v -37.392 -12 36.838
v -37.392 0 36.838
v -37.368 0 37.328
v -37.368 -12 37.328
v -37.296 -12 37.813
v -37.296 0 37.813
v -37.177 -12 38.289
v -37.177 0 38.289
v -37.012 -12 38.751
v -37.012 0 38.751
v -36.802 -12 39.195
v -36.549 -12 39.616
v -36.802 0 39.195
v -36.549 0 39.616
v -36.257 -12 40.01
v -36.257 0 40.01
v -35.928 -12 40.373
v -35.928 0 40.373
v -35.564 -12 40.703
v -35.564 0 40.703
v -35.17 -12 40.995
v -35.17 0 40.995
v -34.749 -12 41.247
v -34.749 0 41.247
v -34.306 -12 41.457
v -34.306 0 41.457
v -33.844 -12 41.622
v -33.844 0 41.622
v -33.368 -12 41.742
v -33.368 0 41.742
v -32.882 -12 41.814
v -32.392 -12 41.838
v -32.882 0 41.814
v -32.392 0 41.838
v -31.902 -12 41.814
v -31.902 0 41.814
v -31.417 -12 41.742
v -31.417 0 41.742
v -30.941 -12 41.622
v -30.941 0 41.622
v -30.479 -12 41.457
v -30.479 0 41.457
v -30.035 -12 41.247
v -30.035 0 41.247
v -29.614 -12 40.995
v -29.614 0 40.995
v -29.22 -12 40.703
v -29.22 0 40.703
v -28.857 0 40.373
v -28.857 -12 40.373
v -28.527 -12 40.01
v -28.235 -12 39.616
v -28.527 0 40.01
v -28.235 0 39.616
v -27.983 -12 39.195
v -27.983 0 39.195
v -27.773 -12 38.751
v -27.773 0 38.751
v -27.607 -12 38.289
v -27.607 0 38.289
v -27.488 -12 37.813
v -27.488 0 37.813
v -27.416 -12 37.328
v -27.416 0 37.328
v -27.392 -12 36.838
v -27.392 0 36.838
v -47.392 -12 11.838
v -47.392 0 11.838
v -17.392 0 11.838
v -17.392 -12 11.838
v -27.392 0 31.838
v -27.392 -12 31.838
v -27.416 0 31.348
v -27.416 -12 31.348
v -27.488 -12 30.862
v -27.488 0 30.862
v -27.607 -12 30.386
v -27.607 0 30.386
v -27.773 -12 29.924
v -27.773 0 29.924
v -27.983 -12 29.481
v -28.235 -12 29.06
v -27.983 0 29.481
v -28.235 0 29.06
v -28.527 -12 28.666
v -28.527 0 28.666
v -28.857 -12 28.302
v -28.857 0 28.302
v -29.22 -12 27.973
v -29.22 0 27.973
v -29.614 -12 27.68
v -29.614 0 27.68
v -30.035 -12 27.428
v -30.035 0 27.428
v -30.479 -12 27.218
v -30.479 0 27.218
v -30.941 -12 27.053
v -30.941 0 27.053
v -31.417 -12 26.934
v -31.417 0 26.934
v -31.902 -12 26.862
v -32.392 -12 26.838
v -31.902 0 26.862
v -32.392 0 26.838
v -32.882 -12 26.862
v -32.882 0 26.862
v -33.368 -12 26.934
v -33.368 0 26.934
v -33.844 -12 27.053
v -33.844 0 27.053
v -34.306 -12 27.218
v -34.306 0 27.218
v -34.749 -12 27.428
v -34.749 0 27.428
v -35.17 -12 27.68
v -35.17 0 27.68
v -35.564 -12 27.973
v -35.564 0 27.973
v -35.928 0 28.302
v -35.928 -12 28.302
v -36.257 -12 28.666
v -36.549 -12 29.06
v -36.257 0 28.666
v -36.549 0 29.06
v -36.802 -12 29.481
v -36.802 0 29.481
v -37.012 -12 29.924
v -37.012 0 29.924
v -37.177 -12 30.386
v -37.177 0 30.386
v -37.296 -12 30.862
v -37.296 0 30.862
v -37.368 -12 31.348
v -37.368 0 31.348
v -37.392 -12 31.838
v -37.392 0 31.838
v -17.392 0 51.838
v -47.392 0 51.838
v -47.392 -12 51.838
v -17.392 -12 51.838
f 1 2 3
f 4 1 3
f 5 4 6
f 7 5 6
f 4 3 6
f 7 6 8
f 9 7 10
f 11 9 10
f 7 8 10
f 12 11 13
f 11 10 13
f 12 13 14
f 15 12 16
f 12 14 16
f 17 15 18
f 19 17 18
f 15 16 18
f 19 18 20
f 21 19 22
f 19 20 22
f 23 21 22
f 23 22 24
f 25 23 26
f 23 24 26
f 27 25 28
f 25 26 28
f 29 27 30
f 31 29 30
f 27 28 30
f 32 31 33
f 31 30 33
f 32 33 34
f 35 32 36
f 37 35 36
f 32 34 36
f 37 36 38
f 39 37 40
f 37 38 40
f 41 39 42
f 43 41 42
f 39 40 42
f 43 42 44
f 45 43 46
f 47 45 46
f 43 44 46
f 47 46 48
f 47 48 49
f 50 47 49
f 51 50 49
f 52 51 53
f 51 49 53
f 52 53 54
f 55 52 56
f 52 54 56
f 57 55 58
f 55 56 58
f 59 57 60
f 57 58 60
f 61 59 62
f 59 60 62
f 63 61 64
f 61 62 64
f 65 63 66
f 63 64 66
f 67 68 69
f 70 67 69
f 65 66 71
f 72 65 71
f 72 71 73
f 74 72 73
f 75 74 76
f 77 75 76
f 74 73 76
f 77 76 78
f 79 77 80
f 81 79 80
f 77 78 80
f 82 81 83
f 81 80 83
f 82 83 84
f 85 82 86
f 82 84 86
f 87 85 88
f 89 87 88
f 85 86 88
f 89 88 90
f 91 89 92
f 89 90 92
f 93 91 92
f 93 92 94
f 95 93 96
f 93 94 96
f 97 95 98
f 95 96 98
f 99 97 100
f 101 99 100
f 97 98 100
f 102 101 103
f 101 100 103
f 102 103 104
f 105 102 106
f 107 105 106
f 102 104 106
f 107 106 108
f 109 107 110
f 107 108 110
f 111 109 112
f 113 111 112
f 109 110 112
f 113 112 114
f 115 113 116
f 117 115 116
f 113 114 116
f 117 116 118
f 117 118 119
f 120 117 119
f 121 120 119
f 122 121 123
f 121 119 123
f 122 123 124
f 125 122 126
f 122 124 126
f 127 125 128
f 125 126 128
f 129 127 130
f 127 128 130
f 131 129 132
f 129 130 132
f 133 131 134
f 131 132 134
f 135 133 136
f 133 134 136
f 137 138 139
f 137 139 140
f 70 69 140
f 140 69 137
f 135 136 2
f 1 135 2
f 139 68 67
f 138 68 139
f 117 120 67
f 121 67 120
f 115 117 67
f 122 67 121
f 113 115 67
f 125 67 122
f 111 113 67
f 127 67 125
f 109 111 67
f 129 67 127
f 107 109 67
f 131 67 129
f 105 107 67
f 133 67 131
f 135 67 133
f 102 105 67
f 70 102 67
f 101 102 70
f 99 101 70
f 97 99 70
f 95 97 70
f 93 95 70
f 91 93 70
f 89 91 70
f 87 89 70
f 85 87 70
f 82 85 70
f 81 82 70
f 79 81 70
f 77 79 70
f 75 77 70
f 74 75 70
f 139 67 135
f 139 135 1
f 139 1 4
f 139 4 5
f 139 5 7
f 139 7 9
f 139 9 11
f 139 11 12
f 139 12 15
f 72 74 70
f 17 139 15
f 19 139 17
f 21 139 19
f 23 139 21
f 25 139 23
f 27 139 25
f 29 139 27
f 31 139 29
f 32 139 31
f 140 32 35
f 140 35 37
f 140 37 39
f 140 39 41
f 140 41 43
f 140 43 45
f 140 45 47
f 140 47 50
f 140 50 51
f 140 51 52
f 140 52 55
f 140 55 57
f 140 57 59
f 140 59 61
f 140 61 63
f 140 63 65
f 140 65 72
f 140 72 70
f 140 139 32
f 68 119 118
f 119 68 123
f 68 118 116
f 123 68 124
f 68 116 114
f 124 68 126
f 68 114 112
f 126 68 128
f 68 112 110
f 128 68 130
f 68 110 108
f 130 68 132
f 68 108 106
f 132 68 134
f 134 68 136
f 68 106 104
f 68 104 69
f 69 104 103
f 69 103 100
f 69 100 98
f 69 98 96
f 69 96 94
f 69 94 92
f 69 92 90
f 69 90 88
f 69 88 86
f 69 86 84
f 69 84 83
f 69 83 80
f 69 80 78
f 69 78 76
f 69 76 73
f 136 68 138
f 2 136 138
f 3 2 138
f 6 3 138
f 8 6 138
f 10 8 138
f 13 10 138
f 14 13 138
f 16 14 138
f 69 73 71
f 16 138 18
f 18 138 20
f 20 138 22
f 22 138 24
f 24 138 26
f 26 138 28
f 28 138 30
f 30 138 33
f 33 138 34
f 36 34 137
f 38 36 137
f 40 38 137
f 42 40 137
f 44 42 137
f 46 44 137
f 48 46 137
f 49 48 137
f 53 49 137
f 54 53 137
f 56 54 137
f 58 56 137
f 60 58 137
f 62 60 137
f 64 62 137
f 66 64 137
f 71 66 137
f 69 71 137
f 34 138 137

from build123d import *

# Parameters (mm, degrees)
F0_W     = 30
F0_H     = 40
F1_DEPTH = 12


with BuildPart() as f1:
    # F0 (on Front) → F1 (new body)
    with BuildSketch(Plane.XZ):
        with Locations((-32.392114, 31.837786)):
            Rectangle(F0_W, F0_H)
        with BuildLine():
            ThreePointArc((-37.392114, 36.837786), (-32.392114, 41.837786), (-27.392114, 36.837786))
            Line((-27.392114, 36.837786), (-27.392114, 31.837786))
            ThreePointArc((-27.392114, 31.837786), (-32.392114, 26.837786), (-37.392114, 31.837786))
            Line((-37.392114, 31.837786), (-37.392114, 36.837786))
        make_face(mode=Mode.SUBTRACT)
    extrude(amount=F1_DEPTH)


solid = f1.part
